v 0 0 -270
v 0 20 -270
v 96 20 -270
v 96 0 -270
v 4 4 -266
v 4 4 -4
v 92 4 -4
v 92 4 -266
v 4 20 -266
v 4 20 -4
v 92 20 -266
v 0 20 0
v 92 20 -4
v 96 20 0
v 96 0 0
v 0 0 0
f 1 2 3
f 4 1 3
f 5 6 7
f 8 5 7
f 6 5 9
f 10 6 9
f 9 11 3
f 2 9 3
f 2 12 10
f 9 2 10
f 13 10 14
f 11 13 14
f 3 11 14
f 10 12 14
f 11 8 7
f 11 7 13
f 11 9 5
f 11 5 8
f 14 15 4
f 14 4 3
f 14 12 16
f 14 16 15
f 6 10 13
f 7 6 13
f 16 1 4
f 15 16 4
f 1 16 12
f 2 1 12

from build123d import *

# Parameters (mm, degrees)
SKETCH3_W           = 96
SKETCH3_H           = 20
BOSS_EXTRUDE1_DEPTH = 270
SHELL1_T            = -4


with BuildPart() as part:
    # Sketch3 → Boss-Extrude1 (new body)
    with BuildSketch(Plane.XY):
        with Locations((48, 10)):
            Rectangle(SKETCH3_W, SKETCH3_H)
    extrude(amount=-BOSS_EXTRUDE1_DEPTH)

    # Shell1
    shell1_openings = [part.faces().sort_by_distance(p)[0] for p in [
        (48, 20, -135),
    ]]
    offset(amount=SHELL1_T, openings=shell1_openings, kind=Kind.INTERSECTION)


solid = part.part
